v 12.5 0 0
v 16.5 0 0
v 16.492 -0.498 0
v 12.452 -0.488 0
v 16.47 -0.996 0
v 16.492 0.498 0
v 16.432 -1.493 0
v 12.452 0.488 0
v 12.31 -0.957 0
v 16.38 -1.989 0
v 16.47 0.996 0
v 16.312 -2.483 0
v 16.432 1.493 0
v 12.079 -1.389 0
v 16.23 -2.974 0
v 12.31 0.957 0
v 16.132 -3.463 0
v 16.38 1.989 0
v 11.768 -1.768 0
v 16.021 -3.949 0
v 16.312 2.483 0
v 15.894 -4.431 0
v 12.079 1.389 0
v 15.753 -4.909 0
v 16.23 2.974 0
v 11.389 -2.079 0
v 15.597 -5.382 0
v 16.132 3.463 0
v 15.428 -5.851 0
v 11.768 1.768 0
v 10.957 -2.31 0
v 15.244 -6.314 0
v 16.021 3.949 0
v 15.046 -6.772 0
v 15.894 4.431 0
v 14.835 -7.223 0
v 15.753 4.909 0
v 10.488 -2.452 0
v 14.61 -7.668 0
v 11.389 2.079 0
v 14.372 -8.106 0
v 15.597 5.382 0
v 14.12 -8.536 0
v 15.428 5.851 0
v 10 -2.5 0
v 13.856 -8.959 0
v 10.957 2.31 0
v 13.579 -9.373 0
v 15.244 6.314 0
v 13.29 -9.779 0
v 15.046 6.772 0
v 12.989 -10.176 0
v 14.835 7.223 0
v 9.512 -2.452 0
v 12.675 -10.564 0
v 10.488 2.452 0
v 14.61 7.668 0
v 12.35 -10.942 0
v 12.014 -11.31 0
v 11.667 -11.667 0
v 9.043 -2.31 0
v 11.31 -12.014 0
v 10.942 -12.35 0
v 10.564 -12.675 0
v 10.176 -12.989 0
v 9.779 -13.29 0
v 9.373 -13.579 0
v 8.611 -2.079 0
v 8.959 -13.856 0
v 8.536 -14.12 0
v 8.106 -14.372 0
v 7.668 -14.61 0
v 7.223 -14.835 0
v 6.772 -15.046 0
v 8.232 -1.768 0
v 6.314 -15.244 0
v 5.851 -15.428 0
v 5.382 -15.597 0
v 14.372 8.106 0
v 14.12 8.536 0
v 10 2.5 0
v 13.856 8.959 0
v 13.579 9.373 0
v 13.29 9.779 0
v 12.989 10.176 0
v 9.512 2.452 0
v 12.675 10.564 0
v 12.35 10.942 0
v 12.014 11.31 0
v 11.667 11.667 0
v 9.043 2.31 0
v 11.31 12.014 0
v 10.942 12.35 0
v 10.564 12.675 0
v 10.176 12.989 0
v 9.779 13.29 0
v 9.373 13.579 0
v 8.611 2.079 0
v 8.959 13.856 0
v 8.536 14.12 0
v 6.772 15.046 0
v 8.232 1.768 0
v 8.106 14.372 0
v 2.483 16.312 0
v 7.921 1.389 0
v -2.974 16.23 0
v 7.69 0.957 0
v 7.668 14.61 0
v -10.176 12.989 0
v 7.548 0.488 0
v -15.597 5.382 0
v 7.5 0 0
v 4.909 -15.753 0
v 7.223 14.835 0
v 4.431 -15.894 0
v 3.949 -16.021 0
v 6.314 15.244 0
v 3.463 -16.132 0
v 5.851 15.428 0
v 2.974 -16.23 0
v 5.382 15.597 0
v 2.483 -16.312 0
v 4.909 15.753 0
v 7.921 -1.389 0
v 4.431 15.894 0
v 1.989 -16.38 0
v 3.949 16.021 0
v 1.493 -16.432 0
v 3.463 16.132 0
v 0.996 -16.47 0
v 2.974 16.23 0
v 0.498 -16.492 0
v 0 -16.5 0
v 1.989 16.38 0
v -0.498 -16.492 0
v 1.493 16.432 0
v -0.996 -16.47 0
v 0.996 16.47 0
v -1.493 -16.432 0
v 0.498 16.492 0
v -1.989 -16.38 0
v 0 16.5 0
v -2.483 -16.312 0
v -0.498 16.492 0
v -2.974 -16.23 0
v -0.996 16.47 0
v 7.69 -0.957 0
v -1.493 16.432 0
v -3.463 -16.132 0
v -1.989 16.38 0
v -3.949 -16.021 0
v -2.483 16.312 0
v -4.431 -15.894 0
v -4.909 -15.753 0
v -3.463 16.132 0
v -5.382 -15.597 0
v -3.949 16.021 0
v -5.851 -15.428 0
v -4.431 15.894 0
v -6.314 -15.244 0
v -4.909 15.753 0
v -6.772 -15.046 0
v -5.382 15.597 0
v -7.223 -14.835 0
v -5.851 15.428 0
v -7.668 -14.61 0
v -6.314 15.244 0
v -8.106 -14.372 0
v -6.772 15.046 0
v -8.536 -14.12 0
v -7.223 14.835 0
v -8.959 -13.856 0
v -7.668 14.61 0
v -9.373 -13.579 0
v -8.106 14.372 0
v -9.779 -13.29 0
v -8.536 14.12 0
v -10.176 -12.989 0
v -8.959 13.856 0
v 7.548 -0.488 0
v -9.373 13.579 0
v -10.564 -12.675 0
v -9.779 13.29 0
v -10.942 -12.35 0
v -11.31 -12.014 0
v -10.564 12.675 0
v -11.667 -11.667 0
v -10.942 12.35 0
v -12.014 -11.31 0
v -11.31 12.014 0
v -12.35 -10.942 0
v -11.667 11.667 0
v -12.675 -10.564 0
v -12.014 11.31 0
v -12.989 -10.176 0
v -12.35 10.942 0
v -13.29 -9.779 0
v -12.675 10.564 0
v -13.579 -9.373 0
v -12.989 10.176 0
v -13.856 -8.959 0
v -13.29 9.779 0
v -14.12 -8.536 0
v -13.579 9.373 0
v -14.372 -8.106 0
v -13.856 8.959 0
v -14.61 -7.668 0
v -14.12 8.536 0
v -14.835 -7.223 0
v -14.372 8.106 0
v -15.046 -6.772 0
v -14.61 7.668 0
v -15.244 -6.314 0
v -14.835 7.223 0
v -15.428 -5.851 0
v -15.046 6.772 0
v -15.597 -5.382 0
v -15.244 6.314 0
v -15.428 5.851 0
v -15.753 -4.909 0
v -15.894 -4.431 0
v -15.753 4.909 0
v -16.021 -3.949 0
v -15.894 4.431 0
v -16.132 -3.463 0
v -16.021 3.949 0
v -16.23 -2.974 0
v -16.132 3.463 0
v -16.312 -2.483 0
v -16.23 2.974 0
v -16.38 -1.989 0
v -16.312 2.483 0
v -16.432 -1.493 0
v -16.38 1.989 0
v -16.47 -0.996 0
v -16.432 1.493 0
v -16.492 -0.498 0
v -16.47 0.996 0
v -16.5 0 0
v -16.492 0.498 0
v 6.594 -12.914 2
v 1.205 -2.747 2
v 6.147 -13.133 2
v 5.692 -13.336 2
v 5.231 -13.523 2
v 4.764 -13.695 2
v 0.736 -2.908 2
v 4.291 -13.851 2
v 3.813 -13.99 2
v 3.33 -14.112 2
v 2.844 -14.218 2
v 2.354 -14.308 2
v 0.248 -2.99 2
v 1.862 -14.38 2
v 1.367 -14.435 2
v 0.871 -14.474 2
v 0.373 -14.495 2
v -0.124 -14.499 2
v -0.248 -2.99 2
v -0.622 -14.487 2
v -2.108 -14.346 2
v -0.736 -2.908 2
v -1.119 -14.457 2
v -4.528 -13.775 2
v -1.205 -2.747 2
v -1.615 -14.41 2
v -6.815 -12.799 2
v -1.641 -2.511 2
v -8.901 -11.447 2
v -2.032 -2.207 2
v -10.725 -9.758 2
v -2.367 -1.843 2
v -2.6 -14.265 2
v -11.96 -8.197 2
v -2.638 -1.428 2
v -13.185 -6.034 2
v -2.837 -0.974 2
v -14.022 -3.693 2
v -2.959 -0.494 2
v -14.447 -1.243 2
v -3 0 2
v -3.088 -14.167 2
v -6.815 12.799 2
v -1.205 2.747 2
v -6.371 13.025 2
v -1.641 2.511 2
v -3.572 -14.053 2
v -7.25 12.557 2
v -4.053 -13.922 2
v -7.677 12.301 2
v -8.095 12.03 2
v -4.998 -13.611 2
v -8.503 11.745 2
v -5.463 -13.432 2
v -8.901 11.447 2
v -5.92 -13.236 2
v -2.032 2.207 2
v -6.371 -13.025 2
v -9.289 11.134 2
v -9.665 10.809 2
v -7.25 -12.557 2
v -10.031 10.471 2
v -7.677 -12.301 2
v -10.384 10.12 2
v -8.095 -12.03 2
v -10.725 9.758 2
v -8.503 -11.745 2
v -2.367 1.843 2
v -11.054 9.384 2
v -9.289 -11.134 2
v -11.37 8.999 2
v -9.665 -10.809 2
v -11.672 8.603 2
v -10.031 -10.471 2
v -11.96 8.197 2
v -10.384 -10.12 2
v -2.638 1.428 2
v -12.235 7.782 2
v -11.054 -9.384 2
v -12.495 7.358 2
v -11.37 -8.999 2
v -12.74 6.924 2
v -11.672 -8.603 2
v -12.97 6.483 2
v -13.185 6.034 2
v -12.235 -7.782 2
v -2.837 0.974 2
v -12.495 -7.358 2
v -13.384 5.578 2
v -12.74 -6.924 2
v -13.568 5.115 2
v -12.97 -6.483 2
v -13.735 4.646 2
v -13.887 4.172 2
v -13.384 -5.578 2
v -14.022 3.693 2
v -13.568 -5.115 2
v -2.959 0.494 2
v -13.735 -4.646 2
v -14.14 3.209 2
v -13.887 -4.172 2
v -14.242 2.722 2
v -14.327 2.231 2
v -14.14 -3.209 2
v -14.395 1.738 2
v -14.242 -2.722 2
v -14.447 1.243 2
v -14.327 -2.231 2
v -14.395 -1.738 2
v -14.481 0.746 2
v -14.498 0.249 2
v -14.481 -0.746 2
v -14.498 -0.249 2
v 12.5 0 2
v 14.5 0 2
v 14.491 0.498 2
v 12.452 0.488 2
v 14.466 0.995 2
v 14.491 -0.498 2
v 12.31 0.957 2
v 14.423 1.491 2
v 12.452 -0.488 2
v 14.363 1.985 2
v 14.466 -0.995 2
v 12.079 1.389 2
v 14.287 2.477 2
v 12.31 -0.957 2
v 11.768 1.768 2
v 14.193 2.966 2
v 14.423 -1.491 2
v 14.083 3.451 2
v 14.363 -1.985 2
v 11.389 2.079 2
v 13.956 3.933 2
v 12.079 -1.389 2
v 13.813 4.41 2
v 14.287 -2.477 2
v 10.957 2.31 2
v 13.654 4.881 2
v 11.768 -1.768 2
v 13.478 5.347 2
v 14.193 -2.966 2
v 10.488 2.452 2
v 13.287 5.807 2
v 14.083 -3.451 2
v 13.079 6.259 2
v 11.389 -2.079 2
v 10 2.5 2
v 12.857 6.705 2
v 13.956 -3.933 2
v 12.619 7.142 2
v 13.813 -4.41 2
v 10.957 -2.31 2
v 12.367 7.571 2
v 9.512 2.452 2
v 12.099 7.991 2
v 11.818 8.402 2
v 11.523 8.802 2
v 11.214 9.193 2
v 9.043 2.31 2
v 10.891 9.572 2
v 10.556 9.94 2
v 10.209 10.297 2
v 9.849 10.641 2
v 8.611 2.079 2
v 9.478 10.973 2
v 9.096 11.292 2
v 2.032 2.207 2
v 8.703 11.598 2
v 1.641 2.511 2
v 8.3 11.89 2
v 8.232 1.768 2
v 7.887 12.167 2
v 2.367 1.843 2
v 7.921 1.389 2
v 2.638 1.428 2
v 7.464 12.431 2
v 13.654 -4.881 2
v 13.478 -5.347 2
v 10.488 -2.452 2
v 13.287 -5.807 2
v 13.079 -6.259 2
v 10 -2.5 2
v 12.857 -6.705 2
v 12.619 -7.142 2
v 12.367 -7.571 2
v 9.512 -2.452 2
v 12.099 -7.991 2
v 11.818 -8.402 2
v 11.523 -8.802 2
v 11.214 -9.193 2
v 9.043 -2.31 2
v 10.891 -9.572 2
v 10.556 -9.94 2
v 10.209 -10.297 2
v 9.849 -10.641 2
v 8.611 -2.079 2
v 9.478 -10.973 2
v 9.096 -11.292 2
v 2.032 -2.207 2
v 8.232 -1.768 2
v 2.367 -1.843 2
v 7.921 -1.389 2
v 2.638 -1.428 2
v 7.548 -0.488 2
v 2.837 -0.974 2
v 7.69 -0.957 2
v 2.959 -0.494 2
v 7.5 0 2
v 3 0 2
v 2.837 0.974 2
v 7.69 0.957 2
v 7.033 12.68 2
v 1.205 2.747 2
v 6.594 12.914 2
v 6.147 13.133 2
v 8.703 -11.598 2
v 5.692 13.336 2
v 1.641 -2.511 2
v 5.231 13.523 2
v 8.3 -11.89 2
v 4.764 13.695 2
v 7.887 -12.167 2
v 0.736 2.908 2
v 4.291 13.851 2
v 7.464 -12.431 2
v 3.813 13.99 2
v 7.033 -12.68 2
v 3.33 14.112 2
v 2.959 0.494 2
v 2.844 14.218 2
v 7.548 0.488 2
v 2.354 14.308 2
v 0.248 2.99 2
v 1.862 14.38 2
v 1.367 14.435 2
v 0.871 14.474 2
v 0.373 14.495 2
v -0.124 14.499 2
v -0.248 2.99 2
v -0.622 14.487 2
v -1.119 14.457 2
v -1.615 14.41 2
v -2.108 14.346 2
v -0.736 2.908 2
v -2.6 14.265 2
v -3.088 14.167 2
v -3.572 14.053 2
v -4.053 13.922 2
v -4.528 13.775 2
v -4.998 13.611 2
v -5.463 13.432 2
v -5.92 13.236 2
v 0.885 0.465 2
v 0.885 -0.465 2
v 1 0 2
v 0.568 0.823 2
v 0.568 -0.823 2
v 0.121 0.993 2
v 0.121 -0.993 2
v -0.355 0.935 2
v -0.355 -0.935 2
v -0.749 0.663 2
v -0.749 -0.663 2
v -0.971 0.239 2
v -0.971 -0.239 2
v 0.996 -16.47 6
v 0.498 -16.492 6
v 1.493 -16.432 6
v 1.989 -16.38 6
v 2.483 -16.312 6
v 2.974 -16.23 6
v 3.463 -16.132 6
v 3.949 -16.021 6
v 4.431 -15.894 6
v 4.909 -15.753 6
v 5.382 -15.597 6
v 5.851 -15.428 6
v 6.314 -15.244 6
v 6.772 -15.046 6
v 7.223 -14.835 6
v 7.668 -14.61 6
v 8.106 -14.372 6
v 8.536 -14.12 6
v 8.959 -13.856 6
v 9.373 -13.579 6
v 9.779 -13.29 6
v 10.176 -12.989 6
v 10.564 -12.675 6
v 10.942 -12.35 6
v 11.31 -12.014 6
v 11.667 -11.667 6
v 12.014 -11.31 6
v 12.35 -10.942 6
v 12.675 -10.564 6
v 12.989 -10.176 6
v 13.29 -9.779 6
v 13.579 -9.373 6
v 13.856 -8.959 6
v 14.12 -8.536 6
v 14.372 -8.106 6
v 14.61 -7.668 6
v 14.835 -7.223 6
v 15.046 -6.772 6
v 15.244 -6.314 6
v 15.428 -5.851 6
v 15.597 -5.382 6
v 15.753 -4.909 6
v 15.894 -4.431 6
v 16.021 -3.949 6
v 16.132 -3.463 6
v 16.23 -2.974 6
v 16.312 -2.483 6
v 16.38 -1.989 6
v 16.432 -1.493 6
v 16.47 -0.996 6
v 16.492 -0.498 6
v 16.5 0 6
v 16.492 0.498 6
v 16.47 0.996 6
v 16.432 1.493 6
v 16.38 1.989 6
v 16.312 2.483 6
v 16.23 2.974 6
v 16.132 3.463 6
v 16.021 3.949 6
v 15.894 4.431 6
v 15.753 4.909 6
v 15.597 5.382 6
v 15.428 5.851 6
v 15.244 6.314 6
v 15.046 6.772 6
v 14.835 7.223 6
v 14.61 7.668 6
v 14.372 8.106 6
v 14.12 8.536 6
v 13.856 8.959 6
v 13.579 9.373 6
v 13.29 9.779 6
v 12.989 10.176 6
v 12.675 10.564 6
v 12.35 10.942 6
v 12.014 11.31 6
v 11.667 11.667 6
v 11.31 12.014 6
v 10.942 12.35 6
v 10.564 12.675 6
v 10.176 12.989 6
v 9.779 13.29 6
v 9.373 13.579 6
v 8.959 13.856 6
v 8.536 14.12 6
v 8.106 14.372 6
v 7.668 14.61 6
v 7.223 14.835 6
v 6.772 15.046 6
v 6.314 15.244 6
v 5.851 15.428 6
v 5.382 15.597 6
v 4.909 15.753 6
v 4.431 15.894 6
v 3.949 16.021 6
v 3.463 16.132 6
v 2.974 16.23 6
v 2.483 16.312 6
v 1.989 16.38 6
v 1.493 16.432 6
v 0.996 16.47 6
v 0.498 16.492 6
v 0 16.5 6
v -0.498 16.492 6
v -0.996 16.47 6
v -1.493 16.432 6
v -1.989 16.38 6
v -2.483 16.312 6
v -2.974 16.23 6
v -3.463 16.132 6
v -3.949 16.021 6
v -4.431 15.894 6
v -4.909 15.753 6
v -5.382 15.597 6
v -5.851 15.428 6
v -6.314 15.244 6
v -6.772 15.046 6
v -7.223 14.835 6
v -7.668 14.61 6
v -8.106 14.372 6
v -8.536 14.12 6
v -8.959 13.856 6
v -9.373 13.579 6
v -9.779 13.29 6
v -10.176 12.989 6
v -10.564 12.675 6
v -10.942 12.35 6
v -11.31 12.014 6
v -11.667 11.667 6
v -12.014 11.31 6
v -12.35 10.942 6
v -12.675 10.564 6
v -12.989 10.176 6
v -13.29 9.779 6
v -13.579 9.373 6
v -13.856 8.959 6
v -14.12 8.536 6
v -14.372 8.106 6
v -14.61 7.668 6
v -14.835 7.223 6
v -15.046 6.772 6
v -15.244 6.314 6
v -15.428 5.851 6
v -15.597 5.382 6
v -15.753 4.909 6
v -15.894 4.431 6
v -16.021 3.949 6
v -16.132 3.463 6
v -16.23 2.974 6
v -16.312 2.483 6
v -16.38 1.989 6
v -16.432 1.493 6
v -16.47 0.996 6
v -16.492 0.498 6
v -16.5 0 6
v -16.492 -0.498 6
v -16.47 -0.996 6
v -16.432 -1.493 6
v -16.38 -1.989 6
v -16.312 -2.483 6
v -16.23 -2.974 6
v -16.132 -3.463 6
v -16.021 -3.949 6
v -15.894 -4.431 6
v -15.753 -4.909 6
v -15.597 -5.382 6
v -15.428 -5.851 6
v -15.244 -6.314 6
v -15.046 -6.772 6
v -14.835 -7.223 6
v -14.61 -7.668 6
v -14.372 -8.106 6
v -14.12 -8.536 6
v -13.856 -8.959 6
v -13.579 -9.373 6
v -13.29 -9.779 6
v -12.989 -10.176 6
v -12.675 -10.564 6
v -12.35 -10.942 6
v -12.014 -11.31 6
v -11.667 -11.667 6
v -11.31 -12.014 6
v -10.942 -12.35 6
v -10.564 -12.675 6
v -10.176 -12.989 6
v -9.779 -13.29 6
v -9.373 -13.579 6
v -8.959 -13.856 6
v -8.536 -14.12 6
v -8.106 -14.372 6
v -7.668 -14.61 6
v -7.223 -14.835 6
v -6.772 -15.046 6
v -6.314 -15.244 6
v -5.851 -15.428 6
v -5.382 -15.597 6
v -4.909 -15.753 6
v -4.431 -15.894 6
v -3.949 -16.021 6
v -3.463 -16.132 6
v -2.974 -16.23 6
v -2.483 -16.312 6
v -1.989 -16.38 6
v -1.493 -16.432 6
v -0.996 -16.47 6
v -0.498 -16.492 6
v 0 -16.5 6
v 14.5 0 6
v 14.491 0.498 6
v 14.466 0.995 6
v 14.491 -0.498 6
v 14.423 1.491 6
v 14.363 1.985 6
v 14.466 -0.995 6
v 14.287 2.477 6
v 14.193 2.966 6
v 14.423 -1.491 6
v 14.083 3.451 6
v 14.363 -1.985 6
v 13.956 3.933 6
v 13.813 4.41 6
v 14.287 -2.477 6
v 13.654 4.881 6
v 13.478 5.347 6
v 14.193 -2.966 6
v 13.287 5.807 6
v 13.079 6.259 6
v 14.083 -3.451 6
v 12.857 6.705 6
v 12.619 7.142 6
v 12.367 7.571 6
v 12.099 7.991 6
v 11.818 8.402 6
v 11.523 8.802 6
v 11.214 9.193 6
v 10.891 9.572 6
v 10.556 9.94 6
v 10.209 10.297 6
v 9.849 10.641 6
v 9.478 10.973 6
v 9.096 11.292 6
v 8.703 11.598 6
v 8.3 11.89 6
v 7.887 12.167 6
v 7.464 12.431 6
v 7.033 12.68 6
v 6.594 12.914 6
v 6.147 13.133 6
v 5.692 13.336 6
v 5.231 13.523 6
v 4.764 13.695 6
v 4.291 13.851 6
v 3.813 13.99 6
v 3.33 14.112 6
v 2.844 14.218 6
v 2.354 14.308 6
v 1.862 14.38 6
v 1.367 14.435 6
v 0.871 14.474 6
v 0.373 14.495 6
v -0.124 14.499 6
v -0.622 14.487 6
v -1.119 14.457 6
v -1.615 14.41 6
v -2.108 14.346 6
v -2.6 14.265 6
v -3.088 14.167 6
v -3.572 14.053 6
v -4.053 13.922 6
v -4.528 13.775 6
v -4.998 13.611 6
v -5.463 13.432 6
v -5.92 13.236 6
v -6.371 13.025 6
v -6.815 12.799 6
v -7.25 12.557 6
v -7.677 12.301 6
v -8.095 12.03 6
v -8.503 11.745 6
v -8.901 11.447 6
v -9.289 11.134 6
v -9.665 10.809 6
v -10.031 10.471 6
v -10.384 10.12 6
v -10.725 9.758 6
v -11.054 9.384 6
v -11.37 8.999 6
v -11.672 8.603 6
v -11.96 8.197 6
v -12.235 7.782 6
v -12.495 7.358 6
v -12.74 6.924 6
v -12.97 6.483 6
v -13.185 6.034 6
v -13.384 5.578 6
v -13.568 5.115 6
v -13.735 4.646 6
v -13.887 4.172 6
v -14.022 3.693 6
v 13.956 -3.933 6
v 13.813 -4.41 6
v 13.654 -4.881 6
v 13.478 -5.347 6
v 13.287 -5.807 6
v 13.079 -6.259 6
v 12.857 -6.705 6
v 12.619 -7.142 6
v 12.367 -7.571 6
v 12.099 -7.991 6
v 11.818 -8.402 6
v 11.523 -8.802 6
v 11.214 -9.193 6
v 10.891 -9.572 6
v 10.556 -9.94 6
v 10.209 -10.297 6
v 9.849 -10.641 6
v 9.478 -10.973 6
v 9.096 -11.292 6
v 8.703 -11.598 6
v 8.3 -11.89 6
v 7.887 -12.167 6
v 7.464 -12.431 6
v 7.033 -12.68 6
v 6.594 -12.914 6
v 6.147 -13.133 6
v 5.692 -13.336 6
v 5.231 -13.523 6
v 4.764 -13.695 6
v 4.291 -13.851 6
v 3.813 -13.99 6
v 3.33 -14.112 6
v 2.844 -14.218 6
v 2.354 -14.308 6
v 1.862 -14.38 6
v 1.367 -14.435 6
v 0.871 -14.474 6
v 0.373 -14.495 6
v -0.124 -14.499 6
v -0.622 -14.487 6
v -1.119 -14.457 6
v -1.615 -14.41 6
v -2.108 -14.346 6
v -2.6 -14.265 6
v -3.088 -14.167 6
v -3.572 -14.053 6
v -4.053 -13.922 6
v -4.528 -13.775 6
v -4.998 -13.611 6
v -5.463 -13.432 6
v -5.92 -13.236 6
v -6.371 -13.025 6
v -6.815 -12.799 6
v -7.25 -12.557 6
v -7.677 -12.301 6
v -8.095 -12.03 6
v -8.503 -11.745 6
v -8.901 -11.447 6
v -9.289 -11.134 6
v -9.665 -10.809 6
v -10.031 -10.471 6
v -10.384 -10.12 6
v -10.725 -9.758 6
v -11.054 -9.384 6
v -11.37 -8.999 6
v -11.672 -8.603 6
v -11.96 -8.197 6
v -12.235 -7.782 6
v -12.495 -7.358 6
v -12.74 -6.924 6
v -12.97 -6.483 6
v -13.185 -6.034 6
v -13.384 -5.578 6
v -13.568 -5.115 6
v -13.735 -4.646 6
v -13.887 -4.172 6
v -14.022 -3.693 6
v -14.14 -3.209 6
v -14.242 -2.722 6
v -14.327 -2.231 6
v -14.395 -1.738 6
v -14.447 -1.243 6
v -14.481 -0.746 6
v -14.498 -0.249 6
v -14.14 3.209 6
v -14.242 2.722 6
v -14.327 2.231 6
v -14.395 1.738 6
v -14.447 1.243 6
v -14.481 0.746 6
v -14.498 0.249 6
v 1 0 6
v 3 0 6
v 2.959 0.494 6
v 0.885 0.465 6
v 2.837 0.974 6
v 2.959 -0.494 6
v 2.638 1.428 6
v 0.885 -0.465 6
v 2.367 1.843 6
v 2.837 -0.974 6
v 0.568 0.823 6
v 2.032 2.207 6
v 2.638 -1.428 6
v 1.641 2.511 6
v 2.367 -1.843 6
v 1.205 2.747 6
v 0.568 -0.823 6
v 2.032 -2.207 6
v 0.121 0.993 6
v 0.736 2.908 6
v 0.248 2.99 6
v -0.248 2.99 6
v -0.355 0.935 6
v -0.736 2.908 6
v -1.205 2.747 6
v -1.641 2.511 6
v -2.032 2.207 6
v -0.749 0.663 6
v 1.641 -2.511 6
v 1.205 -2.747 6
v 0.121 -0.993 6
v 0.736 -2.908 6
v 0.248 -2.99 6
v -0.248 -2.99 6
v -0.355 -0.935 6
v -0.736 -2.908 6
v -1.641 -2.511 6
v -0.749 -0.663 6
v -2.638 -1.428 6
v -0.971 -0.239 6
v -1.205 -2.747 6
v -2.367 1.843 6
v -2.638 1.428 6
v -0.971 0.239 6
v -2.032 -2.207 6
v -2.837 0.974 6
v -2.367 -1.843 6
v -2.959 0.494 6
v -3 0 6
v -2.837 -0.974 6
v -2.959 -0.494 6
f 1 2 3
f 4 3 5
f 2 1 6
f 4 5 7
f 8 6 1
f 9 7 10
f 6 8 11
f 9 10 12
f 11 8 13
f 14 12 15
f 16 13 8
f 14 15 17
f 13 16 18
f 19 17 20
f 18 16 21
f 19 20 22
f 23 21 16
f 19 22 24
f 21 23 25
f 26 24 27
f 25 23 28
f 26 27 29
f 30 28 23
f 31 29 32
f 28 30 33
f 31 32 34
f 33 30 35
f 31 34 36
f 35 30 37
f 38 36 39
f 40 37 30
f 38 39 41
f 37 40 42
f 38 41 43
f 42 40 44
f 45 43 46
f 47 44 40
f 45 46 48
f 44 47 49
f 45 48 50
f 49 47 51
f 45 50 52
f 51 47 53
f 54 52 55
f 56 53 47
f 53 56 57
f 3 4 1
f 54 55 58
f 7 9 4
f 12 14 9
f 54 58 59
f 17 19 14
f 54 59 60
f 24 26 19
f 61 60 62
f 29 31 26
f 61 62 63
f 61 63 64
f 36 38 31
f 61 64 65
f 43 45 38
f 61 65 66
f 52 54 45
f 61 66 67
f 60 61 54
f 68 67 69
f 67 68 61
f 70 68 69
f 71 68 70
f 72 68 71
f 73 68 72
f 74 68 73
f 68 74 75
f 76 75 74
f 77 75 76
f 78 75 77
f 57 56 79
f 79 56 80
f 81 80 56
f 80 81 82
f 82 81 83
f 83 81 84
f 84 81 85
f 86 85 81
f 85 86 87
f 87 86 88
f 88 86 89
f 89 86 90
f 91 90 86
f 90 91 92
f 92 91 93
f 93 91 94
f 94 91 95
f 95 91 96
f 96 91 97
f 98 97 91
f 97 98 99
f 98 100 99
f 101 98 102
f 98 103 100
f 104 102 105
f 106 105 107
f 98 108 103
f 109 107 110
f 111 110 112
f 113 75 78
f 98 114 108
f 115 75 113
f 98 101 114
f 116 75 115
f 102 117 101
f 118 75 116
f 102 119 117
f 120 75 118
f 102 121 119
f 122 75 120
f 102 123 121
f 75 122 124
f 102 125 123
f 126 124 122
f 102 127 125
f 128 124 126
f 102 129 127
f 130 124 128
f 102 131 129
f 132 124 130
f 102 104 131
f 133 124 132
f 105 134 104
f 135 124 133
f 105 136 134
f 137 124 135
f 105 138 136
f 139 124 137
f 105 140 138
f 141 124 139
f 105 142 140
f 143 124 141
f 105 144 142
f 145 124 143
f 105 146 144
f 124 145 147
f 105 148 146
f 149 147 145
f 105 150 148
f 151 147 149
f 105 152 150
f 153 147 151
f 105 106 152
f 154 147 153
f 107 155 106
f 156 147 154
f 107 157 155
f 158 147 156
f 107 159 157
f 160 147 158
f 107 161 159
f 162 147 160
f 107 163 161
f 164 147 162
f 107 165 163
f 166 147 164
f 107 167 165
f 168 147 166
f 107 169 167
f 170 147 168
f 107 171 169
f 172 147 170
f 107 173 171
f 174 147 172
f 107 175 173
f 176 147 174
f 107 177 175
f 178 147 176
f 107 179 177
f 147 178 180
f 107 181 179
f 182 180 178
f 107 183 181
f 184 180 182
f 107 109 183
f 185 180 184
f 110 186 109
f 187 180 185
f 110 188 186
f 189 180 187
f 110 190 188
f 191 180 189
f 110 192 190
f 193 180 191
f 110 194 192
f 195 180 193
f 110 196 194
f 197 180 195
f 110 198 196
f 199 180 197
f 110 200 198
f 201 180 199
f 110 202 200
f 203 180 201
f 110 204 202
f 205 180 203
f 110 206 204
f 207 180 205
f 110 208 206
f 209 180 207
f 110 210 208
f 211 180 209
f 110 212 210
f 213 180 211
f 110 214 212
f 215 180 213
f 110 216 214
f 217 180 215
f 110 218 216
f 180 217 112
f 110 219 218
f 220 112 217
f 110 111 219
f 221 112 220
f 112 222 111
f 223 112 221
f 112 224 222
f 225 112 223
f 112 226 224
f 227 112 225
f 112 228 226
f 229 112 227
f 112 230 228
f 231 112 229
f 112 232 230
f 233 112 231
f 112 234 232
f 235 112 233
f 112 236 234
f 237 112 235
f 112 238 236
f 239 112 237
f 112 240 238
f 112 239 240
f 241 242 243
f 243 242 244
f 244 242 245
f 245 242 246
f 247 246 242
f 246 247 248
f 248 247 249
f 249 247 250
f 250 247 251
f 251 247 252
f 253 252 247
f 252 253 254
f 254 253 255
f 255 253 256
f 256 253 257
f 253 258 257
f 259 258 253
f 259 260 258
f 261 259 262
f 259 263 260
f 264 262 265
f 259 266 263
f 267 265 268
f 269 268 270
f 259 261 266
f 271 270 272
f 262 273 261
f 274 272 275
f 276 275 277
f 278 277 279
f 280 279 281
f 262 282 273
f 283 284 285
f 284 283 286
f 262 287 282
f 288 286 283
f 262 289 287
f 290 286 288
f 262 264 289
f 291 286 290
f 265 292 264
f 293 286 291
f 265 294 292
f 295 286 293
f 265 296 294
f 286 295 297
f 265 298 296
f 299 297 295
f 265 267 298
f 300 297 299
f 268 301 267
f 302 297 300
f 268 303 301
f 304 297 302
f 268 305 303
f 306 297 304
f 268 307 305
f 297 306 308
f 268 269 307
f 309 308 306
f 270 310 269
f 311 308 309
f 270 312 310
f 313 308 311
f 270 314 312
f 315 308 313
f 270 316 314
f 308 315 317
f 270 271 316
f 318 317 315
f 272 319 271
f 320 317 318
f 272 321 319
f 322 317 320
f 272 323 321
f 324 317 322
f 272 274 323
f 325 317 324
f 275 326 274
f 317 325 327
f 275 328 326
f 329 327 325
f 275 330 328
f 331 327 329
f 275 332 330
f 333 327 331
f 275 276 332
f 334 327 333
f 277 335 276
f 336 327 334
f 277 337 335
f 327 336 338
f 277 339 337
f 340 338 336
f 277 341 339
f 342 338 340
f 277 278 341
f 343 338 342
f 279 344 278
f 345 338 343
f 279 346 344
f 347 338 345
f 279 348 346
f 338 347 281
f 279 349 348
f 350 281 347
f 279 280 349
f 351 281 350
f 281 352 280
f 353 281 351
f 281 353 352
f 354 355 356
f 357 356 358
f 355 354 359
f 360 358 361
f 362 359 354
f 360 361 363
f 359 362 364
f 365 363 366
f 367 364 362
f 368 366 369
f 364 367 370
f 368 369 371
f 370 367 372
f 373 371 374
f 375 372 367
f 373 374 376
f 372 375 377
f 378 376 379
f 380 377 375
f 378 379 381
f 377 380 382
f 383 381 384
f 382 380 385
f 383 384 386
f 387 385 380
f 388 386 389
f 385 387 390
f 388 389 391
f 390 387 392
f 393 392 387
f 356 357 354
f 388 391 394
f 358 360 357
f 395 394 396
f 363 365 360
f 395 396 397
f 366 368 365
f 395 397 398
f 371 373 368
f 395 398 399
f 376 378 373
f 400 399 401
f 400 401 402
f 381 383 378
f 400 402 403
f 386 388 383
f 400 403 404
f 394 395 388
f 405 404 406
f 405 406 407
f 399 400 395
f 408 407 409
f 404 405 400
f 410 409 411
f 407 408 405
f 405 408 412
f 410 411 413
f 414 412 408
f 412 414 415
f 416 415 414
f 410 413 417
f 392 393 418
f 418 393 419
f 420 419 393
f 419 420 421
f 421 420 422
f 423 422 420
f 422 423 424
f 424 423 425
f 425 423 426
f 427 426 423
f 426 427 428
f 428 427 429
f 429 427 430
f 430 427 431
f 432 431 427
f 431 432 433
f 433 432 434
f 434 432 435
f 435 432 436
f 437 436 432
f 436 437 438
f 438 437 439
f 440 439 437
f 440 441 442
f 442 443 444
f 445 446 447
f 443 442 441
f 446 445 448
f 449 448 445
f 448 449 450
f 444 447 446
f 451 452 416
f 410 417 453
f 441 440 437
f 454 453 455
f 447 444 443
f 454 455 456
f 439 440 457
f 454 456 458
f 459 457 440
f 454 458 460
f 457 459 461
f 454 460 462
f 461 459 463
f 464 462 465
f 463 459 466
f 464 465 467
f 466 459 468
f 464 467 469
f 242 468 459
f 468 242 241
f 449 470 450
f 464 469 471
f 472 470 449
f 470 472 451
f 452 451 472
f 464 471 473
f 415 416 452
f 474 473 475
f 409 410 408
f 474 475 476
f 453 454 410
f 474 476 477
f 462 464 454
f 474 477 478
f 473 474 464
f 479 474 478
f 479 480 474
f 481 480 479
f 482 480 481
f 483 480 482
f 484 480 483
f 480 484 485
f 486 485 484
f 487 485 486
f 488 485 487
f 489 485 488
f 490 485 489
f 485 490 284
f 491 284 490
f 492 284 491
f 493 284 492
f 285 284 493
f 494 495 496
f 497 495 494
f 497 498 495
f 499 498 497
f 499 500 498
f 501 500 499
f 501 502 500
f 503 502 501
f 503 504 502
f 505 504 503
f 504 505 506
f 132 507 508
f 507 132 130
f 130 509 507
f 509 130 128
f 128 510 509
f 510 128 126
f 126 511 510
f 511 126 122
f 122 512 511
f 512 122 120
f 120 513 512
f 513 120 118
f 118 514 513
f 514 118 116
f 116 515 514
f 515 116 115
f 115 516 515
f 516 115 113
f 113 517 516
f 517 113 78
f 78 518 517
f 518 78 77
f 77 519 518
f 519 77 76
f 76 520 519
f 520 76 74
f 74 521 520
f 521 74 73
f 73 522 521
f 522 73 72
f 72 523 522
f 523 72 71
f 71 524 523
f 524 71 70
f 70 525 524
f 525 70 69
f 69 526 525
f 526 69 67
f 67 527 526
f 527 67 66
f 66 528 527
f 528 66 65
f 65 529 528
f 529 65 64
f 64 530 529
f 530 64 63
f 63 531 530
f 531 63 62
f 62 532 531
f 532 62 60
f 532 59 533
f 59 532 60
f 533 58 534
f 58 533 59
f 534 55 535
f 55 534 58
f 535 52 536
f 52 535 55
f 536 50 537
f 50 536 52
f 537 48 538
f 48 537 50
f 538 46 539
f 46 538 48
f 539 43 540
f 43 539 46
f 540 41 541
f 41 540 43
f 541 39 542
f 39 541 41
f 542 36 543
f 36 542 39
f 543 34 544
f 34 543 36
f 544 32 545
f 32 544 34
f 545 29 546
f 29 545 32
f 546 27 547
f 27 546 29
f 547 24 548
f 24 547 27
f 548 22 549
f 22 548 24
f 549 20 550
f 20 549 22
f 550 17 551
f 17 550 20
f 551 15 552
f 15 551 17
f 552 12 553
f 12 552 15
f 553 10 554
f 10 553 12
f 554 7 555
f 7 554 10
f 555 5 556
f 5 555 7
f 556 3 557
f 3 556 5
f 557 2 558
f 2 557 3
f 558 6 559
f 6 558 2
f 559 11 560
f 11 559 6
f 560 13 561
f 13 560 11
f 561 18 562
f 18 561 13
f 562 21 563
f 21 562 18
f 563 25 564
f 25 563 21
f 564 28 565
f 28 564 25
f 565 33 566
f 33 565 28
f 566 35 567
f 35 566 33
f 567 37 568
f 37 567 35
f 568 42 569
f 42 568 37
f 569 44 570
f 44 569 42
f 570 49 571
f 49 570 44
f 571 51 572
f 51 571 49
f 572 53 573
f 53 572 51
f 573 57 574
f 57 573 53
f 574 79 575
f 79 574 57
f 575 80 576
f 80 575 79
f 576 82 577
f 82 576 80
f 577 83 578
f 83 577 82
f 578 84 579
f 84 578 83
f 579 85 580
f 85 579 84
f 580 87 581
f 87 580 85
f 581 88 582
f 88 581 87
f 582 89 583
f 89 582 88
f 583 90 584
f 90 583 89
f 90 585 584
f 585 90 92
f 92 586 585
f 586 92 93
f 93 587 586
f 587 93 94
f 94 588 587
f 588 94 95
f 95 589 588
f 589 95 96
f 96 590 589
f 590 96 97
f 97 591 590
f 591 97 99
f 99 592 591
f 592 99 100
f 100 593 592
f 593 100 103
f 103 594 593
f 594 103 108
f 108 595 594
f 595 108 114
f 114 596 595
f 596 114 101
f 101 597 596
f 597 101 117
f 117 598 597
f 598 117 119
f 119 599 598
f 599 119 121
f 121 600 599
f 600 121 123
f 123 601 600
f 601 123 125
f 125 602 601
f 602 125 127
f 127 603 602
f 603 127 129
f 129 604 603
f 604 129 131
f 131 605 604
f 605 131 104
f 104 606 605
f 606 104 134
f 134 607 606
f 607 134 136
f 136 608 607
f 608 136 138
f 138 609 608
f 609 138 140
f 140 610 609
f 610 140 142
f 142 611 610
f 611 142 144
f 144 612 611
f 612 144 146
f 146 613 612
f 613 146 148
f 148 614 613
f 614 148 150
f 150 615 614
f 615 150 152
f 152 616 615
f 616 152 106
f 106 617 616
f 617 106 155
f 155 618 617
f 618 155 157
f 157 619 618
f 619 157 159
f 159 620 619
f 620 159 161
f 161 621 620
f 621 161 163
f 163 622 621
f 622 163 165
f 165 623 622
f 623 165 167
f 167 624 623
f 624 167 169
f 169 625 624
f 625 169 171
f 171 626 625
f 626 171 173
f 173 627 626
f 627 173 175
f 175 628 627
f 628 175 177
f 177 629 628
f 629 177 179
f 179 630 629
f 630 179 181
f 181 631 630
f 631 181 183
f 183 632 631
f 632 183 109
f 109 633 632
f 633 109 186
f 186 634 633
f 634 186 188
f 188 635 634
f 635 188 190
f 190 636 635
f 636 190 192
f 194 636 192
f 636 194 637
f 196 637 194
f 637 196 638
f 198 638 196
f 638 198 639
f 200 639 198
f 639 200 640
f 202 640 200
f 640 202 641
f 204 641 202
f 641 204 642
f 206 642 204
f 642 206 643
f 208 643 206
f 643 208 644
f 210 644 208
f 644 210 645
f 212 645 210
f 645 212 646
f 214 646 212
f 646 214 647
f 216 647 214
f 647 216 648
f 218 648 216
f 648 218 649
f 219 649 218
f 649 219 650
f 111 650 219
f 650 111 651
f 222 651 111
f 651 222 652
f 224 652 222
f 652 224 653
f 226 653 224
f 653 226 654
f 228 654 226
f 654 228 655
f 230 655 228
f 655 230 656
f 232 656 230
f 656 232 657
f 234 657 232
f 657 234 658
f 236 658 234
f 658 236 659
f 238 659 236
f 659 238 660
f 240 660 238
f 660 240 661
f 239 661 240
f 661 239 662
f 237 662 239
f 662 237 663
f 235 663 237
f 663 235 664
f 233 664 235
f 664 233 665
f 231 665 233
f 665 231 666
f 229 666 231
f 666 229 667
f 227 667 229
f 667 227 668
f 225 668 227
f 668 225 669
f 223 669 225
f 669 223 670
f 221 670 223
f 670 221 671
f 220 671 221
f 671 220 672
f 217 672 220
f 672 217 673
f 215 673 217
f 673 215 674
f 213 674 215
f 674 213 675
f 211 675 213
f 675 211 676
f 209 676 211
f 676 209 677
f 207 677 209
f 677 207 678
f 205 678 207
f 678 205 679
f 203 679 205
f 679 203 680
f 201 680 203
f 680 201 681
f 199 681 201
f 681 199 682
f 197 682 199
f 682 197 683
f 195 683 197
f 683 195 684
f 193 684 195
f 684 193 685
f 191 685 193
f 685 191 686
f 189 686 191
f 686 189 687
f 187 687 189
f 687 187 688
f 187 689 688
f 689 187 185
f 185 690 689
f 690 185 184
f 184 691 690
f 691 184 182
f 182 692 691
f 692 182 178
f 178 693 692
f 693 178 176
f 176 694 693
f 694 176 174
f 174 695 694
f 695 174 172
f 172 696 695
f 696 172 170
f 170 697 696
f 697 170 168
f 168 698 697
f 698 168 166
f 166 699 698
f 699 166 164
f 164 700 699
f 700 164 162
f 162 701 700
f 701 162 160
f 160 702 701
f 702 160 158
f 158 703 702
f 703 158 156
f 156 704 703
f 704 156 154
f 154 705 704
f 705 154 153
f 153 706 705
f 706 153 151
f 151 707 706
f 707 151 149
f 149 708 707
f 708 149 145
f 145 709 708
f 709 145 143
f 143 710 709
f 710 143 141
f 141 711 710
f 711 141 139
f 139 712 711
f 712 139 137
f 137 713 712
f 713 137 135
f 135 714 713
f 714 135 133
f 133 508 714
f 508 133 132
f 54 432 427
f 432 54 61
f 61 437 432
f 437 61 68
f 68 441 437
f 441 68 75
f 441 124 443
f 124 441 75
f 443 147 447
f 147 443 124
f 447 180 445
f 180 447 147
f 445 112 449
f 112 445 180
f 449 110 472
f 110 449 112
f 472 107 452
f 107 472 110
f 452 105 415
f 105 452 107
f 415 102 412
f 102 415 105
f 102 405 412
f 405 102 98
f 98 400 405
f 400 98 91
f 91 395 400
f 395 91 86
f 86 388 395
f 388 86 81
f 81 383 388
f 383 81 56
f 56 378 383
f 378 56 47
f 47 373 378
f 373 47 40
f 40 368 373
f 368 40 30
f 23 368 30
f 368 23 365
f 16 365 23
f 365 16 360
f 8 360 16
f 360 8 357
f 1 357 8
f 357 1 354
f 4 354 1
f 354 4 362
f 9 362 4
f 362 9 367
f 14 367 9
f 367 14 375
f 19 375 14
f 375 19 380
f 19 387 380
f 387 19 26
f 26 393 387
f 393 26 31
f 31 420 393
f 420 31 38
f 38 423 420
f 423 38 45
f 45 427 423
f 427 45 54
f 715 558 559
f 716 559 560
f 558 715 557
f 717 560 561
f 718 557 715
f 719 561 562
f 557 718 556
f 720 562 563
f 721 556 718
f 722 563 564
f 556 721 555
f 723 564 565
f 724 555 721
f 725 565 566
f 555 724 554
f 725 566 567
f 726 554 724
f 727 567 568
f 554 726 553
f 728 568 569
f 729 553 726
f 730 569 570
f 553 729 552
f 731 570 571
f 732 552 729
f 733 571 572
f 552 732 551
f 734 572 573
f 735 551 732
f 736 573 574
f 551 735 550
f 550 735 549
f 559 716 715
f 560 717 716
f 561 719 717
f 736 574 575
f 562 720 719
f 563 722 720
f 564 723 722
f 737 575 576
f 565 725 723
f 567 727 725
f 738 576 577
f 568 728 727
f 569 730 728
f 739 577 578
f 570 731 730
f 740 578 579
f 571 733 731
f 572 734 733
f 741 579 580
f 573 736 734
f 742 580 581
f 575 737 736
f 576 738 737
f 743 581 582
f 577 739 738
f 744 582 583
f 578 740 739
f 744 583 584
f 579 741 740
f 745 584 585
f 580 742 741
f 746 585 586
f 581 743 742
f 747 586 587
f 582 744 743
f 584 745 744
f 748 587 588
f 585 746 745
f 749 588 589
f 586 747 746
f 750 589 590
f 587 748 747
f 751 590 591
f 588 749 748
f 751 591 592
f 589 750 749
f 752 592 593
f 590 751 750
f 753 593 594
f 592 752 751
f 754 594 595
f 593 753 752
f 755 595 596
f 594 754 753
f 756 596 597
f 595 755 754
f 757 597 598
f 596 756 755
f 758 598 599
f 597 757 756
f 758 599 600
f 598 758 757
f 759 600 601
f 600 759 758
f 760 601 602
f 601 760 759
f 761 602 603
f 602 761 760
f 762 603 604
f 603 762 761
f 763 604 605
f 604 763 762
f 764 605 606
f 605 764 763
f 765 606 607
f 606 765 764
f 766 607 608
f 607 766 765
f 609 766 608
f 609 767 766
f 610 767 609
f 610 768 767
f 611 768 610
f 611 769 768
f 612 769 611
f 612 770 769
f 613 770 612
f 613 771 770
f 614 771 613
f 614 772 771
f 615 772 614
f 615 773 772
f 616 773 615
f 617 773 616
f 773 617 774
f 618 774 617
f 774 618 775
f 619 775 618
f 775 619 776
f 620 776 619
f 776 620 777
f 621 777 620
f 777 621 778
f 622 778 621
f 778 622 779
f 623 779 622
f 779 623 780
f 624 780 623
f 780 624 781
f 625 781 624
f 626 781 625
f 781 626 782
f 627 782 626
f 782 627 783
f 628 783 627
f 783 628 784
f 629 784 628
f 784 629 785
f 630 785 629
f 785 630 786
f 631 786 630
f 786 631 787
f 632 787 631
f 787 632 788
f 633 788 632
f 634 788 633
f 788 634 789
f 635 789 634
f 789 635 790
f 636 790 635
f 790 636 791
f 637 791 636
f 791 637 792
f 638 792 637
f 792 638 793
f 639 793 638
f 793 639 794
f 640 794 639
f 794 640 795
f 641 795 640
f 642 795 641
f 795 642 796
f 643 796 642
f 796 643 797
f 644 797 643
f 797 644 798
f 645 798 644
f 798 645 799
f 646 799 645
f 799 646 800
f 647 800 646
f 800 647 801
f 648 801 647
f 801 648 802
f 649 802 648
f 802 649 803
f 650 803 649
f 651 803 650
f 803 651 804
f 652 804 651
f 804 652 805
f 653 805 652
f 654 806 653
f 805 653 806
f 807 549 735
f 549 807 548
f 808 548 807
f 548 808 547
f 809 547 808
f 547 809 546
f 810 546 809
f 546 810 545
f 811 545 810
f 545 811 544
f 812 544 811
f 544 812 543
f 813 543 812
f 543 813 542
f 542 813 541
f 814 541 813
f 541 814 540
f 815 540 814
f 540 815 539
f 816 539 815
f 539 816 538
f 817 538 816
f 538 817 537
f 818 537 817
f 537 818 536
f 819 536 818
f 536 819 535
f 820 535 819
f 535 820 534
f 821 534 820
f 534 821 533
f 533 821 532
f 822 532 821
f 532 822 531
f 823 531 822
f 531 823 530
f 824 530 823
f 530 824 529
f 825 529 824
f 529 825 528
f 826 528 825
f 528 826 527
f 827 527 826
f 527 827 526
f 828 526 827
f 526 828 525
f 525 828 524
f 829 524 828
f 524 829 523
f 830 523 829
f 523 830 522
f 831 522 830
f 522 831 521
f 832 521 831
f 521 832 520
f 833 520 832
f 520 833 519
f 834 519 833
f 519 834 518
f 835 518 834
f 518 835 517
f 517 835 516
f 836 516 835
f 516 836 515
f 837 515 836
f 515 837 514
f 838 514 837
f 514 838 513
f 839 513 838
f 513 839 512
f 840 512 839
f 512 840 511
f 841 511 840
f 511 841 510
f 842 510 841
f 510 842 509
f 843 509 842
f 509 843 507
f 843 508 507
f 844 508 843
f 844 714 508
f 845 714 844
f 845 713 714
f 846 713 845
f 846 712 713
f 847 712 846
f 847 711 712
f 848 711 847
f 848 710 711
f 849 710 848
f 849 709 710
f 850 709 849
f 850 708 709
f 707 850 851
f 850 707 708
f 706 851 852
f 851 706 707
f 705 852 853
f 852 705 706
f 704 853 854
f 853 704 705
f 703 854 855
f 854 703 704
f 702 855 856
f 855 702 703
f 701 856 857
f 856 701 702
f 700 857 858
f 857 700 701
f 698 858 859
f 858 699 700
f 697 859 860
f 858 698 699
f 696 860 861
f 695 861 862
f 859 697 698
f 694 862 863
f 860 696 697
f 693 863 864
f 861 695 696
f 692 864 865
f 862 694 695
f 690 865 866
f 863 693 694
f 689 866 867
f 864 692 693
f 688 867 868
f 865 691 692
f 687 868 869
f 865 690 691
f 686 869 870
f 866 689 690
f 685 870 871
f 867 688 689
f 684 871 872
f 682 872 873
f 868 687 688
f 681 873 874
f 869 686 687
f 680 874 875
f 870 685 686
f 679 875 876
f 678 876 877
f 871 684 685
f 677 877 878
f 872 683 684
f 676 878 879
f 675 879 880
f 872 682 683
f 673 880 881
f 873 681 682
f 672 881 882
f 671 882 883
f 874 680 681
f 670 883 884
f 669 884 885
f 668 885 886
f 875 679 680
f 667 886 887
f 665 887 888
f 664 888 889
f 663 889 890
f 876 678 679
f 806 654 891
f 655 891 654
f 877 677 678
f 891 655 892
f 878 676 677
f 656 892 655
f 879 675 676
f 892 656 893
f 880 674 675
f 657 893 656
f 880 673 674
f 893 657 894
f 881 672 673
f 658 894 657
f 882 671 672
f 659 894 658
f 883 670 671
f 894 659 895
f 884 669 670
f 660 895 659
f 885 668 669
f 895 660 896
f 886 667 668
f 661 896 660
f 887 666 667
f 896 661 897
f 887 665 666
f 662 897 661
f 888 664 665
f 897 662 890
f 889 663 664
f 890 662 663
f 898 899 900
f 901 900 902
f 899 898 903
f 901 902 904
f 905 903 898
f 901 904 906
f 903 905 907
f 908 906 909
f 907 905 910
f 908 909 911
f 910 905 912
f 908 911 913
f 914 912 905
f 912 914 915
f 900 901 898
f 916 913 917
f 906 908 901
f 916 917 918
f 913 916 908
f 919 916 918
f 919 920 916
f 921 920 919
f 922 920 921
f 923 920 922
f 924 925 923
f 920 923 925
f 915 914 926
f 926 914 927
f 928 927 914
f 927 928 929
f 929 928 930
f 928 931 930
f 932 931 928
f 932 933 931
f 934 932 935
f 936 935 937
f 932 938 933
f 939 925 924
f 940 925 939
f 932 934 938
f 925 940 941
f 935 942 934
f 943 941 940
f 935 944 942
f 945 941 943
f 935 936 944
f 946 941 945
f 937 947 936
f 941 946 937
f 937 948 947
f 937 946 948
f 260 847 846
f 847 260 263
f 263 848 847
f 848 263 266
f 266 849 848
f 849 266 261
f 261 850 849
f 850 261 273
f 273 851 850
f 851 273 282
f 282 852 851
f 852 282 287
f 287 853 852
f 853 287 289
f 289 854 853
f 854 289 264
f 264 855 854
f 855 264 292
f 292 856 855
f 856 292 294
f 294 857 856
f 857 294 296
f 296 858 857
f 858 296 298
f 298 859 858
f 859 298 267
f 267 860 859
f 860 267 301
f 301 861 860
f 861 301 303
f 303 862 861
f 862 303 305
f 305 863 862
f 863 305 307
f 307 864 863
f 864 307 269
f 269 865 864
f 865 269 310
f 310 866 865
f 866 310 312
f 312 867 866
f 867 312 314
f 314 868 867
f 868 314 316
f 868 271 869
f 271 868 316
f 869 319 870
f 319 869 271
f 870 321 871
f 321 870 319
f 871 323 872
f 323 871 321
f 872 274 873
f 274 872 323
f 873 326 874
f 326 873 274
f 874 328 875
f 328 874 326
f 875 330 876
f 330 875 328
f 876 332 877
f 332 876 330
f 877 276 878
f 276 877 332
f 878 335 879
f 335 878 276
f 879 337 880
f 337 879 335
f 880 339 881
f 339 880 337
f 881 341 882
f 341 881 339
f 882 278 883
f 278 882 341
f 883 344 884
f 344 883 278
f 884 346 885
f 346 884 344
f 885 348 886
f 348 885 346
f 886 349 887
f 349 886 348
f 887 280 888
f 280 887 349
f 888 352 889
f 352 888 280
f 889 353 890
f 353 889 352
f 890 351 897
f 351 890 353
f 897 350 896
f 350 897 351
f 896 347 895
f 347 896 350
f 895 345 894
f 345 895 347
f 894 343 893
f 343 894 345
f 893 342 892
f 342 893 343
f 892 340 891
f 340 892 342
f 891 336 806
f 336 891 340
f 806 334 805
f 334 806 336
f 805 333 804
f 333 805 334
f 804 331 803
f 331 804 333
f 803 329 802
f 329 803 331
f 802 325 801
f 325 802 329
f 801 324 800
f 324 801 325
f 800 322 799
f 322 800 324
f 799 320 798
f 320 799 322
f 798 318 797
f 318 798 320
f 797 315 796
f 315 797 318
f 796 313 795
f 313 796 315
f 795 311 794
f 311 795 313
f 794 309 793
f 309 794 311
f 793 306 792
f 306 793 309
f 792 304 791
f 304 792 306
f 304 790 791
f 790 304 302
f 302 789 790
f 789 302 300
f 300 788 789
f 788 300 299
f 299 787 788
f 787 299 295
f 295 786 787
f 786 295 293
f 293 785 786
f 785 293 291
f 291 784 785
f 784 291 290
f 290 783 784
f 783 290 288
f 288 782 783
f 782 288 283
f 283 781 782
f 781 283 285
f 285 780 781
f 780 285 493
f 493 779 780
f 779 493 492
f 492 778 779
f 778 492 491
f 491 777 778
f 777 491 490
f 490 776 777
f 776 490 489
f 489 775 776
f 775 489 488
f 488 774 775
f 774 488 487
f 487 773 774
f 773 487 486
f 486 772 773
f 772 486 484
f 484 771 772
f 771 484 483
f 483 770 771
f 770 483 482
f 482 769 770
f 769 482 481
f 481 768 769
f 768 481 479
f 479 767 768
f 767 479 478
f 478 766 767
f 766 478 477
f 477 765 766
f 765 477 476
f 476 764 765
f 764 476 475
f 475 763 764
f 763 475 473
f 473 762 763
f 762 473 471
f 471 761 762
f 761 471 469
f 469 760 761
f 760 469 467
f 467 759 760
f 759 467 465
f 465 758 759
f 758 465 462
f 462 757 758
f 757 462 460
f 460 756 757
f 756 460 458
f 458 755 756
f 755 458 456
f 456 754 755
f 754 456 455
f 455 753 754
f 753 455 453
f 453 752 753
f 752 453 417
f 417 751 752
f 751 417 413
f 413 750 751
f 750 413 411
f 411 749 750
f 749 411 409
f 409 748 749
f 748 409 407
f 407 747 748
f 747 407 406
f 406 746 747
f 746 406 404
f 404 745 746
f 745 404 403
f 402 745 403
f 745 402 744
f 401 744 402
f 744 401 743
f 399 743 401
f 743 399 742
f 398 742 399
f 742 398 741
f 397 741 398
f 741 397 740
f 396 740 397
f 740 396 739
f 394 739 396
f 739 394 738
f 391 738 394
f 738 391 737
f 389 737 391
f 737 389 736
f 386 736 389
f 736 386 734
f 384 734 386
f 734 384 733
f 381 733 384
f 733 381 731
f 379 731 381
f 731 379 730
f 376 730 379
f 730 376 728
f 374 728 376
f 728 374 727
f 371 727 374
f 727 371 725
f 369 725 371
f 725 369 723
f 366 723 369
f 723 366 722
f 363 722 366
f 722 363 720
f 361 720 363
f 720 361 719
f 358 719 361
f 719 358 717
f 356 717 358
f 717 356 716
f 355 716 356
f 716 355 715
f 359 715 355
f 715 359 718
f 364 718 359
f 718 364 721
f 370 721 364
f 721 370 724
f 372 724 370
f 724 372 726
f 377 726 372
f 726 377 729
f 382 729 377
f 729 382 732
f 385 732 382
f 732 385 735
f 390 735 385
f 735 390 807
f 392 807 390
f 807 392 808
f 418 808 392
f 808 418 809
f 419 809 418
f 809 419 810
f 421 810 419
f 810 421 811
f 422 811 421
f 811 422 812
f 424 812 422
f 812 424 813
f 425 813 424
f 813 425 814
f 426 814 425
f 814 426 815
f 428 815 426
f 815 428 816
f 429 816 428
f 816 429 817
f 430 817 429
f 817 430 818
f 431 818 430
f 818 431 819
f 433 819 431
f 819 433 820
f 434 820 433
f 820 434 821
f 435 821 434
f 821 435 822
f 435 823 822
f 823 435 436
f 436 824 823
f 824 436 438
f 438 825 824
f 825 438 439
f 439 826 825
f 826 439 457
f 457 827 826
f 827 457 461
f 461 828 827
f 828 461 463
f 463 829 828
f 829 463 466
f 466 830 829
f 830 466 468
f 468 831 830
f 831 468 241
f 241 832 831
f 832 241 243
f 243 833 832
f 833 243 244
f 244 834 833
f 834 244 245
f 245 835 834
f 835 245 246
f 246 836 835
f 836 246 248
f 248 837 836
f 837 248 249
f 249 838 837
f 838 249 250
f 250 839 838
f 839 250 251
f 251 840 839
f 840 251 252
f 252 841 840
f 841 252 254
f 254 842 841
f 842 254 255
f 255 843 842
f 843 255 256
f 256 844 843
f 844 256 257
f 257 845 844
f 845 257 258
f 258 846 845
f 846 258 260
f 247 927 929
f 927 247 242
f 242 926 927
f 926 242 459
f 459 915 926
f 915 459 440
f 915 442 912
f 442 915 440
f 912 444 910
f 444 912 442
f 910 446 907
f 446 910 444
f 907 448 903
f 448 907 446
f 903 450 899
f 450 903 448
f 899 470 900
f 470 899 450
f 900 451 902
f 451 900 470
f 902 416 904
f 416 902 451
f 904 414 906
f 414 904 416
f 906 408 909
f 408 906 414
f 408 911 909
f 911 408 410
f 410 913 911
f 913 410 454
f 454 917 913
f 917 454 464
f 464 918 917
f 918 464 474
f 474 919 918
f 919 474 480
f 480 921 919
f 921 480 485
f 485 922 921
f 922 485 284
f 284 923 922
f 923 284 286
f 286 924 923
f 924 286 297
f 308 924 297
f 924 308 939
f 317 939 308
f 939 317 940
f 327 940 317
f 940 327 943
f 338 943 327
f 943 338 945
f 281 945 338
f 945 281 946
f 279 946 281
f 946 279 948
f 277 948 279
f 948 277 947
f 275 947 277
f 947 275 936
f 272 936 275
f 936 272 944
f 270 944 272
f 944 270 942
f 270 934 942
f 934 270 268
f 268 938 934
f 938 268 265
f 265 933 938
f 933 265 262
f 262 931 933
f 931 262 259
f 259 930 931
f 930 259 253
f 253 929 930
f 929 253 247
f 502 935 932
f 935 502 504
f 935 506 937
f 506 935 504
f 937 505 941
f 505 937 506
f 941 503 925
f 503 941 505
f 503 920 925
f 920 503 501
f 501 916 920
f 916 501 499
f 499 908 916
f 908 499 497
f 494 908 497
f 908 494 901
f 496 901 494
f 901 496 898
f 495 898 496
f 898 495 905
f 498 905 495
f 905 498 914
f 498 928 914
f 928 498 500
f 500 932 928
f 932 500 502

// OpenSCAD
$fa = 0.5;
$fs = 0.5;

motor_d = 20;
motor_w = 15;
motor_l = 25;

axis_d = 2;
axis_l = 4;

led_d = 5;
thickness = 2;
height = axis_l + thickness;

d = motor_w + led_d * 2 + thickness*2;

linear_extrude(thickness)
difference() {
    circle(d = d + thickness*2);
    translate([motor_w/2 + led_d/2,0])
    circle(d = led_d);
}


linear_extrude(height)
union() {
    difference() {
        circle(d = d+thickness*2);
        circle(d = d);
    }

    difference() {
        circle(d = axis_d + thickness*2);
        circle(d = axis_d);    
    }
}
